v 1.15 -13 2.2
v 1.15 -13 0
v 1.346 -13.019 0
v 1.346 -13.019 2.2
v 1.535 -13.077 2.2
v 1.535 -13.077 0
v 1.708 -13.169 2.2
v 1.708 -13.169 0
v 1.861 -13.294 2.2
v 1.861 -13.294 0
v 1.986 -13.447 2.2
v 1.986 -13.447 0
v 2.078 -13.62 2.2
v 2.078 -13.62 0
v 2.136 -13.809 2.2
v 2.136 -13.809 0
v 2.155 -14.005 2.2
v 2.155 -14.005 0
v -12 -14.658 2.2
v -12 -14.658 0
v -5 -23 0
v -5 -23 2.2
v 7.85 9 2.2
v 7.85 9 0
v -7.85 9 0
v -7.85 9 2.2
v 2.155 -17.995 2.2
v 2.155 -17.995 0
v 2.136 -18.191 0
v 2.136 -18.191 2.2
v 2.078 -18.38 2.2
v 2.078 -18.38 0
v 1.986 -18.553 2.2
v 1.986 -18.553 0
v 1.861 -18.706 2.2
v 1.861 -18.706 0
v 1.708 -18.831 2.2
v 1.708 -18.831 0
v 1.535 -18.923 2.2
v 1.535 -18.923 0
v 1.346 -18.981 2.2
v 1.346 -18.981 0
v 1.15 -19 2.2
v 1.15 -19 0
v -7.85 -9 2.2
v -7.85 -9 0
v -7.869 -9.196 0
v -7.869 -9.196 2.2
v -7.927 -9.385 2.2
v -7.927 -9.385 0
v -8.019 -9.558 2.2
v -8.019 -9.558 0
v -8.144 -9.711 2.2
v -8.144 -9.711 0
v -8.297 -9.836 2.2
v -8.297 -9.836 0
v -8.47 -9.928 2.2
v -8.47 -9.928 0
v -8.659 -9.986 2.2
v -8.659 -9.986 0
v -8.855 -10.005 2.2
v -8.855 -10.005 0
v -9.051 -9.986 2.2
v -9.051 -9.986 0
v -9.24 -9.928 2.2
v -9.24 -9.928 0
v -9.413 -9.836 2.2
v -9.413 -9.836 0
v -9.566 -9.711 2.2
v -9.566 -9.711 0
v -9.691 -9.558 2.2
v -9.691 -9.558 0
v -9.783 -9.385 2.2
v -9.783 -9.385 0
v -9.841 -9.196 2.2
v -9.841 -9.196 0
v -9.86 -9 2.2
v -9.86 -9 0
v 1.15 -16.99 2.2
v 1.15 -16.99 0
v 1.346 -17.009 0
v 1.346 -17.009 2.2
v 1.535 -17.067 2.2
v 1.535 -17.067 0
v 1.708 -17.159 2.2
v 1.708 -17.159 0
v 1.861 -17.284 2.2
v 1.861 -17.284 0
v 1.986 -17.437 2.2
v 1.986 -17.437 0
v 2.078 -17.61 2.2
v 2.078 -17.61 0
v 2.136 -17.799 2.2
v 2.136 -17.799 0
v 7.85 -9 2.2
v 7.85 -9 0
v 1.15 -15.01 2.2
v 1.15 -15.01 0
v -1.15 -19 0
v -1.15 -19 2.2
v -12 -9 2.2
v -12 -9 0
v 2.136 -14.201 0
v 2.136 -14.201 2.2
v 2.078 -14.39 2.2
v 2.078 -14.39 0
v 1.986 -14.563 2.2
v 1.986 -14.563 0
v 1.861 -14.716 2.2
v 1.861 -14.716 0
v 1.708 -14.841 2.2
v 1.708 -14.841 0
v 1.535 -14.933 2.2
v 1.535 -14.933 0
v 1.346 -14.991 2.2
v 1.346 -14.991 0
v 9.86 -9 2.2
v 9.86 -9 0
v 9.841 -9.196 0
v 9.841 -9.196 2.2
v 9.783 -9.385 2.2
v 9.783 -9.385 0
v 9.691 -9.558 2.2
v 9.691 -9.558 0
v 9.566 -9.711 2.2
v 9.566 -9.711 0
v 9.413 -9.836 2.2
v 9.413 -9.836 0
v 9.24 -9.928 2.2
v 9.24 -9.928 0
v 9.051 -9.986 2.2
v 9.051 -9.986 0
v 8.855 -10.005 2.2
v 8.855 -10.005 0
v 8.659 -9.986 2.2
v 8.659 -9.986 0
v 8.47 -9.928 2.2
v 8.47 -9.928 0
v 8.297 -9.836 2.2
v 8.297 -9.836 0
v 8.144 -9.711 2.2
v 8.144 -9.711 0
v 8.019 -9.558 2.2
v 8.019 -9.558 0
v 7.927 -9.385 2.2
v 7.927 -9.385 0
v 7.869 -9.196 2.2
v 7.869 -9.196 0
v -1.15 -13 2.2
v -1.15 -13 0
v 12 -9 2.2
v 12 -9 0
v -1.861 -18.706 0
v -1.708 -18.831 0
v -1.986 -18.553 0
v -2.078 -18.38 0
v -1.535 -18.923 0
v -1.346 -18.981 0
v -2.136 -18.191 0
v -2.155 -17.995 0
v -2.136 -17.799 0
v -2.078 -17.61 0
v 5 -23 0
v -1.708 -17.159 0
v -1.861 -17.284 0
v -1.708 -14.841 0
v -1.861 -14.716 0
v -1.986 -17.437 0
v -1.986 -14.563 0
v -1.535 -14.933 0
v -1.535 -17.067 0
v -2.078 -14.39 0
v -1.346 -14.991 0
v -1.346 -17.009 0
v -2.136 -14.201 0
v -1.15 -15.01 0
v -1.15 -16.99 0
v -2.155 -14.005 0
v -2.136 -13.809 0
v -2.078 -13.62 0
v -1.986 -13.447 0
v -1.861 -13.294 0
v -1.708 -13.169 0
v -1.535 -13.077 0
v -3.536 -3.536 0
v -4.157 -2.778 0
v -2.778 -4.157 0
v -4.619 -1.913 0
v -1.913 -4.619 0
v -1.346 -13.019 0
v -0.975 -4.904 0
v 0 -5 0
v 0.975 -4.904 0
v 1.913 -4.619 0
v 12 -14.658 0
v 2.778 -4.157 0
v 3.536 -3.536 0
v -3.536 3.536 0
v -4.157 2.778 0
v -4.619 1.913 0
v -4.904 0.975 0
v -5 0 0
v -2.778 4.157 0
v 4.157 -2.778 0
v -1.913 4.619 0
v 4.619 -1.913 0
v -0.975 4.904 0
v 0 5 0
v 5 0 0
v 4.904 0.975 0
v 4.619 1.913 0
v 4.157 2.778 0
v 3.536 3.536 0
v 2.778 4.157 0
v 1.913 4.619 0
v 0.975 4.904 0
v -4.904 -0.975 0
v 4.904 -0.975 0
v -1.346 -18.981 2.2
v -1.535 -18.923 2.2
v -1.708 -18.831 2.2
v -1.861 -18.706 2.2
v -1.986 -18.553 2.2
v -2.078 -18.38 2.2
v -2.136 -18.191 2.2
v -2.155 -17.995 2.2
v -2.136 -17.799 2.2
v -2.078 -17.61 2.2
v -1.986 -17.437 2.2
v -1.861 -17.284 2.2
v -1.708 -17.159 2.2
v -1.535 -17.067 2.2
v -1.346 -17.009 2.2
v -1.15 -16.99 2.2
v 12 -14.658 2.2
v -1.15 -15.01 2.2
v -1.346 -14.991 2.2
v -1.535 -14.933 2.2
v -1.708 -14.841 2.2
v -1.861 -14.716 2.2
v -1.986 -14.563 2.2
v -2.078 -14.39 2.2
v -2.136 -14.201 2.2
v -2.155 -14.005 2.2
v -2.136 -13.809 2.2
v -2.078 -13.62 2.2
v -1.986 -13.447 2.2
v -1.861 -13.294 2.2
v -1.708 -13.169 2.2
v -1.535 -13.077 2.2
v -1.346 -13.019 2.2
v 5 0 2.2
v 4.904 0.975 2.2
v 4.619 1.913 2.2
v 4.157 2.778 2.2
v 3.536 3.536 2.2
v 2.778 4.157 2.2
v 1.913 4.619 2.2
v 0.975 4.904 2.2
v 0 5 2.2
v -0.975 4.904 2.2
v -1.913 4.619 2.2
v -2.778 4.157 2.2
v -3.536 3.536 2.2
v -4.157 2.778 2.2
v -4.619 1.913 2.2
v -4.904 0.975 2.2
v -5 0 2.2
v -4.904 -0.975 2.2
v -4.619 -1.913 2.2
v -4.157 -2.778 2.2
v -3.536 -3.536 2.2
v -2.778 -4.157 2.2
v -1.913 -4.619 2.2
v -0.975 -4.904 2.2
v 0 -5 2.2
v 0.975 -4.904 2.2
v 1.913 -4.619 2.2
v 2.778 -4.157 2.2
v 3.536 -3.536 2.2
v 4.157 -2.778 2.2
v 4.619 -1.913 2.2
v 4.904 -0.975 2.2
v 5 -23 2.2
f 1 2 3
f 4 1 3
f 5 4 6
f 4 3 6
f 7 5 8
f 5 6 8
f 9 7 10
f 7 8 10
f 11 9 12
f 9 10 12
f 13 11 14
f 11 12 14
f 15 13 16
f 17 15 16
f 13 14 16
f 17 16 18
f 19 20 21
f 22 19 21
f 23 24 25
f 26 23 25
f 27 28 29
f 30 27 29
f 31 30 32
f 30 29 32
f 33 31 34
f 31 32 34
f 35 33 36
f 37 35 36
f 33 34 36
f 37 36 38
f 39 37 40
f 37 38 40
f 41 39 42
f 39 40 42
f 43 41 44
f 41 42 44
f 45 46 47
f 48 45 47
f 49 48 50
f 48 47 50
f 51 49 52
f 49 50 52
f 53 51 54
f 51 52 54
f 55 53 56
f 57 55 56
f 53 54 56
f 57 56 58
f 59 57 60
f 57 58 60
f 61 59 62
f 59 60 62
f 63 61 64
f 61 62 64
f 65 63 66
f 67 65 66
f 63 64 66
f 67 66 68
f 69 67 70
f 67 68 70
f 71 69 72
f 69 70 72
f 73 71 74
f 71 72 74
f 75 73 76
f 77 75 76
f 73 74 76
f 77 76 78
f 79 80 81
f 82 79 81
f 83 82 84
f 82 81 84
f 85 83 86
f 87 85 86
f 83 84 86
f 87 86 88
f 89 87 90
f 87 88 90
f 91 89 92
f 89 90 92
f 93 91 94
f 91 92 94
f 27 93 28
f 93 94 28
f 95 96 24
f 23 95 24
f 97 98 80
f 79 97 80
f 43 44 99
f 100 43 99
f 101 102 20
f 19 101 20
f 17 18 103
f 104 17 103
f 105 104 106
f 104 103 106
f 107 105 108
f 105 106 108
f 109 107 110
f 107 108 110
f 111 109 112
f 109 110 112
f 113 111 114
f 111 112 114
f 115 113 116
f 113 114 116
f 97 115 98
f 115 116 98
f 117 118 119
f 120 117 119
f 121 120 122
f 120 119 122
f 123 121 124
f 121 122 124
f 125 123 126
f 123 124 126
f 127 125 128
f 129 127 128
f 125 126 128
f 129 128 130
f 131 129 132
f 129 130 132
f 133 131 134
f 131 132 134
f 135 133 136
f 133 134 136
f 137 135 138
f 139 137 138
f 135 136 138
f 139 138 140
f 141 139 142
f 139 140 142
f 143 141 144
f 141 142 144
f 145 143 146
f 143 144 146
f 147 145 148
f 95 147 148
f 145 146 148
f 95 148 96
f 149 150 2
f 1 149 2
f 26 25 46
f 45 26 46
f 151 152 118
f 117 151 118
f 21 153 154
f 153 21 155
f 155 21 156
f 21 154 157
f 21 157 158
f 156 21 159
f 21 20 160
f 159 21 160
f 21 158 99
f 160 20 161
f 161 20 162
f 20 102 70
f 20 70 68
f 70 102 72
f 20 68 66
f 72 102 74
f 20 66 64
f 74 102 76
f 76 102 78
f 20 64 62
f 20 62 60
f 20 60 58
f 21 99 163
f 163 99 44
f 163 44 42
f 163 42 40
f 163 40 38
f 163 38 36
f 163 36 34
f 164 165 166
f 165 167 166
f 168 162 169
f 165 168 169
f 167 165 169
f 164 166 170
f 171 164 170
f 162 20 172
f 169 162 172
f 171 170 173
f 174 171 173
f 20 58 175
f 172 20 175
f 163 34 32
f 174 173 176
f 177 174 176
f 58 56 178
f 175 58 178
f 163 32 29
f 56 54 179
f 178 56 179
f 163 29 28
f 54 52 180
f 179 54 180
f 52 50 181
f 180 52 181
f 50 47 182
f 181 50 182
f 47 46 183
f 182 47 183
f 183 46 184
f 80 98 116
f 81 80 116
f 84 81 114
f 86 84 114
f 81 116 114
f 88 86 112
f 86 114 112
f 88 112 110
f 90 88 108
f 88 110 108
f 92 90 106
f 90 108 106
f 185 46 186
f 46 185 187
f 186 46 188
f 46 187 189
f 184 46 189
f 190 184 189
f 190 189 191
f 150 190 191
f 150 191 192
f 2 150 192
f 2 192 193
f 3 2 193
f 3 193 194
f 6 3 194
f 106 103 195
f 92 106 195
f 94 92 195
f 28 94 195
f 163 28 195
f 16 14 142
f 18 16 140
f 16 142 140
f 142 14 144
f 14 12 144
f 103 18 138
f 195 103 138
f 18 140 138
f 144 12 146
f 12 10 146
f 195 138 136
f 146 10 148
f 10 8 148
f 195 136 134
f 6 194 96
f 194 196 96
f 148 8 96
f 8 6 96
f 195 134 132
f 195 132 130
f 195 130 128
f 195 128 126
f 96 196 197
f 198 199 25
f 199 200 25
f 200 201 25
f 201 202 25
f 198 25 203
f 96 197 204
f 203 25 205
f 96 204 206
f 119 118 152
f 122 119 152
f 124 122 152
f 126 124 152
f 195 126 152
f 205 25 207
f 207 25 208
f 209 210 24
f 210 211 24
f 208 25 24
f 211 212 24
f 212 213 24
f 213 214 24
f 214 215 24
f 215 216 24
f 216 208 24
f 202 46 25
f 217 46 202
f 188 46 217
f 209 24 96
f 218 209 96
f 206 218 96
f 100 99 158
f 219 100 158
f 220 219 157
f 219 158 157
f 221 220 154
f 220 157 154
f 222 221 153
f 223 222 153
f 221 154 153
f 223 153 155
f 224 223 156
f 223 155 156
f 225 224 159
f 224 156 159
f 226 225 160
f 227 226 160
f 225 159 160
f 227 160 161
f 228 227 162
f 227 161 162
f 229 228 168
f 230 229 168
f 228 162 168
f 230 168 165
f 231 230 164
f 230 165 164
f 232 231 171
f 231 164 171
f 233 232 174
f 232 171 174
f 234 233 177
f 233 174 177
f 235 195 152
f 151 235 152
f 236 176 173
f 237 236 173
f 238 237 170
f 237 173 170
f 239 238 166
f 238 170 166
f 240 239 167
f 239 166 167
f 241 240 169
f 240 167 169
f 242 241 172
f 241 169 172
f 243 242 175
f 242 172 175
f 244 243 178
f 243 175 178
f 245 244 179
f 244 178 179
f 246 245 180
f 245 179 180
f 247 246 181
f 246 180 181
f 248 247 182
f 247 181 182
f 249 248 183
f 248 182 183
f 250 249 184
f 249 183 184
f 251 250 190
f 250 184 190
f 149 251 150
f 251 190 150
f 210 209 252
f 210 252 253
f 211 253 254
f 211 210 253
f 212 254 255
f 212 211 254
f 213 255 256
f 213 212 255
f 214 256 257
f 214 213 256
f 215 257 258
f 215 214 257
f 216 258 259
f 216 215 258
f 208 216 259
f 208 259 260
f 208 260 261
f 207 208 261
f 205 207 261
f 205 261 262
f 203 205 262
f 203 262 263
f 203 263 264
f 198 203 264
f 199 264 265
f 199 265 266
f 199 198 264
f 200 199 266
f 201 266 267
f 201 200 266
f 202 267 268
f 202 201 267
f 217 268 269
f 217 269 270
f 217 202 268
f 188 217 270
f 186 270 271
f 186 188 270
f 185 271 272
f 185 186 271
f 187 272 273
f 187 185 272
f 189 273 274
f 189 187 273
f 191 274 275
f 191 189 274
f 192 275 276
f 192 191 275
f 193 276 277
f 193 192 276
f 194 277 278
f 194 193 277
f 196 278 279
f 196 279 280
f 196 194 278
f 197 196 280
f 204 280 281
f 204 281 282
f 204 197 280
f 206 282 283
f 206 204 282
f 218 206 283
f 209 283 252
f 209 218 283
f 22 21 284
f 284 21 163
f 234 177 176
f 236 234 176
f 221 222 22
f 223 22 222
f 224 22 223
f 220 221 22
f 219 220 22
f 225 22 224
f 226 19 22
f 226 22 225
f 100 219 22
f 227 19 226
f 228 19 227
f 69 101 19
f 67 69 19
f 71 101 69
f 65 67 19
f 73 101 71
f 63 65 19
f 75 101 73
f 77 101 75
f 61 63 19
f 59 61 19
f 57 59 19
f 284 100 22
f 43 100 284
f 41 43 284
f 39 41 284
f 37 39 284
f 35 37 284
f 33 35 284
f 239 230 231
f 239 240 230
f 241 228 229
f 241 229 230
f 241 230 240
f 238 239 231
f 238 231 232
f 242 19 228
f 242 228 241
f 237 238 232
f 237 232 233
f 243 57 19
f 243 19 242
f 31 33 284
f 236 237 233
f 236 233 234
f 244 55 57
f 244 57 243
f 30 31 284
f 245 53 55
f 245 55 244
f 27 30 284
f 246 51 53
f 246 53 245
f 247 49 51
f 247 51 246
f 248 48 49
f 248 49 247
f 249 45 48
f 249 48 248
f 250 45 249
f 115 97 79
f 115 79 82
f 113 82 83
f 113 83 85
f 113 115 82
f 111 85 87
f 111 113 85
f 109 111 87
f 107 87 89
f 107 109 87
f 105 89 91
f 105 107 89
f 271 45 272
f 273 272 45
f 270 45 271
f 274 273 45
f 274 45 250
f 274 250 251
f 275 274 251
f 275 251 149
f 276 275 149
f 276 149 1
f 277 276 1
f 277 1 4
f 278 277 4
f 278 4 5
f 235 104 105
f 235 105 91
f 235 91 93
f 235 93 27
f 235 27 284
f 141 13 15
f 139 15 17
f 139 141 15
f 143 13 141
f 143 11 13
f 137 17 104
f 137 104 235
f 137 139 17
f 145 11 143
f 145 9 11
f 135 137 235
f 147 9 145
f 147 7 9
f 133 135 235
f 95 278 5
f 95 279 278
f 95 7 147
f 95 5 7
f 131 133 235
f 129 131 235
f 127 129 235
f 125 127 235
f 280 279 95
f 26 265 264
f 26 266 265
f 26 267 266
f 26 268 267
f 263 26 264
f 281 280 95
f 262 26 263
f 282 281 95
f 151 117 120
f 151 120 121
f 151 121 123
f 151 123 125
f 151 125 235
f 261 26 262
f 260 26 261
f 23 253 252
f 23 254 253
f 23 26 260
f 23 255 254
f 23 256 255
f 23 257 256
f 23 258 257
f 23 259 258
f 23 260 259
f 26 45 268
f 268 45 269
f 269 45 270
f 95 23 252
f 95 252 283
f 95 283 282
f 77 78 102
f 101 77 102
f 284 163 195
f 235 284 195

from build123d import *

# Parameters (mm, degrees)
SKETCH_1_R      = 5
EXTRUDE_1_DEPTH = 2.2


with BuildPart() as part:
    # 草图1 → 凸台-拉伸1 (new body)
    with BuildSketch(Plane.XY):
        with BuildLine():
            Line((-7.85, 9), (-7.85, -9))
            ThreePointArc((-7.85, -9), (-8.855, -10.005), (-9.86, -9))
            Line((-9.86, -9), (-12, -9))
            Line((-12, -9), (-12, -14.657724852))
            Line((-12, -14.657724852), (-5, -23))
            Line((-5, -23), (5, -23))
            Line((5, -23), (12, -14.657724852))
            Line((12, -14.657724852), (12, -9))
            Line((12, -9), (9.86, -9))
            ThreePointArc((9.86, -9), (8.855, -10.005), (7.85, -9))
            Line((7.85, -9), (7.85, 9))
            Line((7.85, 9), (-7.85, 9))
        make_face()
        with BuildLine():
            ThreePointArc((2.155, -17.995), (1.860642315, -18.705642315), (1.15, -19))
            Line((1.15, -19), (-1.15, -19))
            ThreePointArc((-1.15, -19), (-2.155, -17.995), (-1.15, -16.99))
            Line((-1.15, -16.99), (-1.15, -15.01))
            ThreePointArc((-1.15, -15.01), (-2.155, -14.005), (-1.15, -13))
            Line((-1.15, -13), (1.15, -13))
            ThreePointArc((1.15, -13), (1.860642315, -13.294357685), (2.155, -14.005))
            ThreePointArc((2.155, -14.005), (1.860642315, -14.715642315), (1.15, -15.01))
            Line((1.15, -15.01), (1.15, -16.99))
            ThreePointArc((1.15, -16.99), (1.860642315, -17.284357685), (2.155, -17.995))
        make_face(mode=Mode.SUBTRACT)
        Circle(SKETCH_1_R, mode=Mode.SUBTRACT)
    extrude(amount=EXTRUDE_1_DEPTH)


solid = part.part
